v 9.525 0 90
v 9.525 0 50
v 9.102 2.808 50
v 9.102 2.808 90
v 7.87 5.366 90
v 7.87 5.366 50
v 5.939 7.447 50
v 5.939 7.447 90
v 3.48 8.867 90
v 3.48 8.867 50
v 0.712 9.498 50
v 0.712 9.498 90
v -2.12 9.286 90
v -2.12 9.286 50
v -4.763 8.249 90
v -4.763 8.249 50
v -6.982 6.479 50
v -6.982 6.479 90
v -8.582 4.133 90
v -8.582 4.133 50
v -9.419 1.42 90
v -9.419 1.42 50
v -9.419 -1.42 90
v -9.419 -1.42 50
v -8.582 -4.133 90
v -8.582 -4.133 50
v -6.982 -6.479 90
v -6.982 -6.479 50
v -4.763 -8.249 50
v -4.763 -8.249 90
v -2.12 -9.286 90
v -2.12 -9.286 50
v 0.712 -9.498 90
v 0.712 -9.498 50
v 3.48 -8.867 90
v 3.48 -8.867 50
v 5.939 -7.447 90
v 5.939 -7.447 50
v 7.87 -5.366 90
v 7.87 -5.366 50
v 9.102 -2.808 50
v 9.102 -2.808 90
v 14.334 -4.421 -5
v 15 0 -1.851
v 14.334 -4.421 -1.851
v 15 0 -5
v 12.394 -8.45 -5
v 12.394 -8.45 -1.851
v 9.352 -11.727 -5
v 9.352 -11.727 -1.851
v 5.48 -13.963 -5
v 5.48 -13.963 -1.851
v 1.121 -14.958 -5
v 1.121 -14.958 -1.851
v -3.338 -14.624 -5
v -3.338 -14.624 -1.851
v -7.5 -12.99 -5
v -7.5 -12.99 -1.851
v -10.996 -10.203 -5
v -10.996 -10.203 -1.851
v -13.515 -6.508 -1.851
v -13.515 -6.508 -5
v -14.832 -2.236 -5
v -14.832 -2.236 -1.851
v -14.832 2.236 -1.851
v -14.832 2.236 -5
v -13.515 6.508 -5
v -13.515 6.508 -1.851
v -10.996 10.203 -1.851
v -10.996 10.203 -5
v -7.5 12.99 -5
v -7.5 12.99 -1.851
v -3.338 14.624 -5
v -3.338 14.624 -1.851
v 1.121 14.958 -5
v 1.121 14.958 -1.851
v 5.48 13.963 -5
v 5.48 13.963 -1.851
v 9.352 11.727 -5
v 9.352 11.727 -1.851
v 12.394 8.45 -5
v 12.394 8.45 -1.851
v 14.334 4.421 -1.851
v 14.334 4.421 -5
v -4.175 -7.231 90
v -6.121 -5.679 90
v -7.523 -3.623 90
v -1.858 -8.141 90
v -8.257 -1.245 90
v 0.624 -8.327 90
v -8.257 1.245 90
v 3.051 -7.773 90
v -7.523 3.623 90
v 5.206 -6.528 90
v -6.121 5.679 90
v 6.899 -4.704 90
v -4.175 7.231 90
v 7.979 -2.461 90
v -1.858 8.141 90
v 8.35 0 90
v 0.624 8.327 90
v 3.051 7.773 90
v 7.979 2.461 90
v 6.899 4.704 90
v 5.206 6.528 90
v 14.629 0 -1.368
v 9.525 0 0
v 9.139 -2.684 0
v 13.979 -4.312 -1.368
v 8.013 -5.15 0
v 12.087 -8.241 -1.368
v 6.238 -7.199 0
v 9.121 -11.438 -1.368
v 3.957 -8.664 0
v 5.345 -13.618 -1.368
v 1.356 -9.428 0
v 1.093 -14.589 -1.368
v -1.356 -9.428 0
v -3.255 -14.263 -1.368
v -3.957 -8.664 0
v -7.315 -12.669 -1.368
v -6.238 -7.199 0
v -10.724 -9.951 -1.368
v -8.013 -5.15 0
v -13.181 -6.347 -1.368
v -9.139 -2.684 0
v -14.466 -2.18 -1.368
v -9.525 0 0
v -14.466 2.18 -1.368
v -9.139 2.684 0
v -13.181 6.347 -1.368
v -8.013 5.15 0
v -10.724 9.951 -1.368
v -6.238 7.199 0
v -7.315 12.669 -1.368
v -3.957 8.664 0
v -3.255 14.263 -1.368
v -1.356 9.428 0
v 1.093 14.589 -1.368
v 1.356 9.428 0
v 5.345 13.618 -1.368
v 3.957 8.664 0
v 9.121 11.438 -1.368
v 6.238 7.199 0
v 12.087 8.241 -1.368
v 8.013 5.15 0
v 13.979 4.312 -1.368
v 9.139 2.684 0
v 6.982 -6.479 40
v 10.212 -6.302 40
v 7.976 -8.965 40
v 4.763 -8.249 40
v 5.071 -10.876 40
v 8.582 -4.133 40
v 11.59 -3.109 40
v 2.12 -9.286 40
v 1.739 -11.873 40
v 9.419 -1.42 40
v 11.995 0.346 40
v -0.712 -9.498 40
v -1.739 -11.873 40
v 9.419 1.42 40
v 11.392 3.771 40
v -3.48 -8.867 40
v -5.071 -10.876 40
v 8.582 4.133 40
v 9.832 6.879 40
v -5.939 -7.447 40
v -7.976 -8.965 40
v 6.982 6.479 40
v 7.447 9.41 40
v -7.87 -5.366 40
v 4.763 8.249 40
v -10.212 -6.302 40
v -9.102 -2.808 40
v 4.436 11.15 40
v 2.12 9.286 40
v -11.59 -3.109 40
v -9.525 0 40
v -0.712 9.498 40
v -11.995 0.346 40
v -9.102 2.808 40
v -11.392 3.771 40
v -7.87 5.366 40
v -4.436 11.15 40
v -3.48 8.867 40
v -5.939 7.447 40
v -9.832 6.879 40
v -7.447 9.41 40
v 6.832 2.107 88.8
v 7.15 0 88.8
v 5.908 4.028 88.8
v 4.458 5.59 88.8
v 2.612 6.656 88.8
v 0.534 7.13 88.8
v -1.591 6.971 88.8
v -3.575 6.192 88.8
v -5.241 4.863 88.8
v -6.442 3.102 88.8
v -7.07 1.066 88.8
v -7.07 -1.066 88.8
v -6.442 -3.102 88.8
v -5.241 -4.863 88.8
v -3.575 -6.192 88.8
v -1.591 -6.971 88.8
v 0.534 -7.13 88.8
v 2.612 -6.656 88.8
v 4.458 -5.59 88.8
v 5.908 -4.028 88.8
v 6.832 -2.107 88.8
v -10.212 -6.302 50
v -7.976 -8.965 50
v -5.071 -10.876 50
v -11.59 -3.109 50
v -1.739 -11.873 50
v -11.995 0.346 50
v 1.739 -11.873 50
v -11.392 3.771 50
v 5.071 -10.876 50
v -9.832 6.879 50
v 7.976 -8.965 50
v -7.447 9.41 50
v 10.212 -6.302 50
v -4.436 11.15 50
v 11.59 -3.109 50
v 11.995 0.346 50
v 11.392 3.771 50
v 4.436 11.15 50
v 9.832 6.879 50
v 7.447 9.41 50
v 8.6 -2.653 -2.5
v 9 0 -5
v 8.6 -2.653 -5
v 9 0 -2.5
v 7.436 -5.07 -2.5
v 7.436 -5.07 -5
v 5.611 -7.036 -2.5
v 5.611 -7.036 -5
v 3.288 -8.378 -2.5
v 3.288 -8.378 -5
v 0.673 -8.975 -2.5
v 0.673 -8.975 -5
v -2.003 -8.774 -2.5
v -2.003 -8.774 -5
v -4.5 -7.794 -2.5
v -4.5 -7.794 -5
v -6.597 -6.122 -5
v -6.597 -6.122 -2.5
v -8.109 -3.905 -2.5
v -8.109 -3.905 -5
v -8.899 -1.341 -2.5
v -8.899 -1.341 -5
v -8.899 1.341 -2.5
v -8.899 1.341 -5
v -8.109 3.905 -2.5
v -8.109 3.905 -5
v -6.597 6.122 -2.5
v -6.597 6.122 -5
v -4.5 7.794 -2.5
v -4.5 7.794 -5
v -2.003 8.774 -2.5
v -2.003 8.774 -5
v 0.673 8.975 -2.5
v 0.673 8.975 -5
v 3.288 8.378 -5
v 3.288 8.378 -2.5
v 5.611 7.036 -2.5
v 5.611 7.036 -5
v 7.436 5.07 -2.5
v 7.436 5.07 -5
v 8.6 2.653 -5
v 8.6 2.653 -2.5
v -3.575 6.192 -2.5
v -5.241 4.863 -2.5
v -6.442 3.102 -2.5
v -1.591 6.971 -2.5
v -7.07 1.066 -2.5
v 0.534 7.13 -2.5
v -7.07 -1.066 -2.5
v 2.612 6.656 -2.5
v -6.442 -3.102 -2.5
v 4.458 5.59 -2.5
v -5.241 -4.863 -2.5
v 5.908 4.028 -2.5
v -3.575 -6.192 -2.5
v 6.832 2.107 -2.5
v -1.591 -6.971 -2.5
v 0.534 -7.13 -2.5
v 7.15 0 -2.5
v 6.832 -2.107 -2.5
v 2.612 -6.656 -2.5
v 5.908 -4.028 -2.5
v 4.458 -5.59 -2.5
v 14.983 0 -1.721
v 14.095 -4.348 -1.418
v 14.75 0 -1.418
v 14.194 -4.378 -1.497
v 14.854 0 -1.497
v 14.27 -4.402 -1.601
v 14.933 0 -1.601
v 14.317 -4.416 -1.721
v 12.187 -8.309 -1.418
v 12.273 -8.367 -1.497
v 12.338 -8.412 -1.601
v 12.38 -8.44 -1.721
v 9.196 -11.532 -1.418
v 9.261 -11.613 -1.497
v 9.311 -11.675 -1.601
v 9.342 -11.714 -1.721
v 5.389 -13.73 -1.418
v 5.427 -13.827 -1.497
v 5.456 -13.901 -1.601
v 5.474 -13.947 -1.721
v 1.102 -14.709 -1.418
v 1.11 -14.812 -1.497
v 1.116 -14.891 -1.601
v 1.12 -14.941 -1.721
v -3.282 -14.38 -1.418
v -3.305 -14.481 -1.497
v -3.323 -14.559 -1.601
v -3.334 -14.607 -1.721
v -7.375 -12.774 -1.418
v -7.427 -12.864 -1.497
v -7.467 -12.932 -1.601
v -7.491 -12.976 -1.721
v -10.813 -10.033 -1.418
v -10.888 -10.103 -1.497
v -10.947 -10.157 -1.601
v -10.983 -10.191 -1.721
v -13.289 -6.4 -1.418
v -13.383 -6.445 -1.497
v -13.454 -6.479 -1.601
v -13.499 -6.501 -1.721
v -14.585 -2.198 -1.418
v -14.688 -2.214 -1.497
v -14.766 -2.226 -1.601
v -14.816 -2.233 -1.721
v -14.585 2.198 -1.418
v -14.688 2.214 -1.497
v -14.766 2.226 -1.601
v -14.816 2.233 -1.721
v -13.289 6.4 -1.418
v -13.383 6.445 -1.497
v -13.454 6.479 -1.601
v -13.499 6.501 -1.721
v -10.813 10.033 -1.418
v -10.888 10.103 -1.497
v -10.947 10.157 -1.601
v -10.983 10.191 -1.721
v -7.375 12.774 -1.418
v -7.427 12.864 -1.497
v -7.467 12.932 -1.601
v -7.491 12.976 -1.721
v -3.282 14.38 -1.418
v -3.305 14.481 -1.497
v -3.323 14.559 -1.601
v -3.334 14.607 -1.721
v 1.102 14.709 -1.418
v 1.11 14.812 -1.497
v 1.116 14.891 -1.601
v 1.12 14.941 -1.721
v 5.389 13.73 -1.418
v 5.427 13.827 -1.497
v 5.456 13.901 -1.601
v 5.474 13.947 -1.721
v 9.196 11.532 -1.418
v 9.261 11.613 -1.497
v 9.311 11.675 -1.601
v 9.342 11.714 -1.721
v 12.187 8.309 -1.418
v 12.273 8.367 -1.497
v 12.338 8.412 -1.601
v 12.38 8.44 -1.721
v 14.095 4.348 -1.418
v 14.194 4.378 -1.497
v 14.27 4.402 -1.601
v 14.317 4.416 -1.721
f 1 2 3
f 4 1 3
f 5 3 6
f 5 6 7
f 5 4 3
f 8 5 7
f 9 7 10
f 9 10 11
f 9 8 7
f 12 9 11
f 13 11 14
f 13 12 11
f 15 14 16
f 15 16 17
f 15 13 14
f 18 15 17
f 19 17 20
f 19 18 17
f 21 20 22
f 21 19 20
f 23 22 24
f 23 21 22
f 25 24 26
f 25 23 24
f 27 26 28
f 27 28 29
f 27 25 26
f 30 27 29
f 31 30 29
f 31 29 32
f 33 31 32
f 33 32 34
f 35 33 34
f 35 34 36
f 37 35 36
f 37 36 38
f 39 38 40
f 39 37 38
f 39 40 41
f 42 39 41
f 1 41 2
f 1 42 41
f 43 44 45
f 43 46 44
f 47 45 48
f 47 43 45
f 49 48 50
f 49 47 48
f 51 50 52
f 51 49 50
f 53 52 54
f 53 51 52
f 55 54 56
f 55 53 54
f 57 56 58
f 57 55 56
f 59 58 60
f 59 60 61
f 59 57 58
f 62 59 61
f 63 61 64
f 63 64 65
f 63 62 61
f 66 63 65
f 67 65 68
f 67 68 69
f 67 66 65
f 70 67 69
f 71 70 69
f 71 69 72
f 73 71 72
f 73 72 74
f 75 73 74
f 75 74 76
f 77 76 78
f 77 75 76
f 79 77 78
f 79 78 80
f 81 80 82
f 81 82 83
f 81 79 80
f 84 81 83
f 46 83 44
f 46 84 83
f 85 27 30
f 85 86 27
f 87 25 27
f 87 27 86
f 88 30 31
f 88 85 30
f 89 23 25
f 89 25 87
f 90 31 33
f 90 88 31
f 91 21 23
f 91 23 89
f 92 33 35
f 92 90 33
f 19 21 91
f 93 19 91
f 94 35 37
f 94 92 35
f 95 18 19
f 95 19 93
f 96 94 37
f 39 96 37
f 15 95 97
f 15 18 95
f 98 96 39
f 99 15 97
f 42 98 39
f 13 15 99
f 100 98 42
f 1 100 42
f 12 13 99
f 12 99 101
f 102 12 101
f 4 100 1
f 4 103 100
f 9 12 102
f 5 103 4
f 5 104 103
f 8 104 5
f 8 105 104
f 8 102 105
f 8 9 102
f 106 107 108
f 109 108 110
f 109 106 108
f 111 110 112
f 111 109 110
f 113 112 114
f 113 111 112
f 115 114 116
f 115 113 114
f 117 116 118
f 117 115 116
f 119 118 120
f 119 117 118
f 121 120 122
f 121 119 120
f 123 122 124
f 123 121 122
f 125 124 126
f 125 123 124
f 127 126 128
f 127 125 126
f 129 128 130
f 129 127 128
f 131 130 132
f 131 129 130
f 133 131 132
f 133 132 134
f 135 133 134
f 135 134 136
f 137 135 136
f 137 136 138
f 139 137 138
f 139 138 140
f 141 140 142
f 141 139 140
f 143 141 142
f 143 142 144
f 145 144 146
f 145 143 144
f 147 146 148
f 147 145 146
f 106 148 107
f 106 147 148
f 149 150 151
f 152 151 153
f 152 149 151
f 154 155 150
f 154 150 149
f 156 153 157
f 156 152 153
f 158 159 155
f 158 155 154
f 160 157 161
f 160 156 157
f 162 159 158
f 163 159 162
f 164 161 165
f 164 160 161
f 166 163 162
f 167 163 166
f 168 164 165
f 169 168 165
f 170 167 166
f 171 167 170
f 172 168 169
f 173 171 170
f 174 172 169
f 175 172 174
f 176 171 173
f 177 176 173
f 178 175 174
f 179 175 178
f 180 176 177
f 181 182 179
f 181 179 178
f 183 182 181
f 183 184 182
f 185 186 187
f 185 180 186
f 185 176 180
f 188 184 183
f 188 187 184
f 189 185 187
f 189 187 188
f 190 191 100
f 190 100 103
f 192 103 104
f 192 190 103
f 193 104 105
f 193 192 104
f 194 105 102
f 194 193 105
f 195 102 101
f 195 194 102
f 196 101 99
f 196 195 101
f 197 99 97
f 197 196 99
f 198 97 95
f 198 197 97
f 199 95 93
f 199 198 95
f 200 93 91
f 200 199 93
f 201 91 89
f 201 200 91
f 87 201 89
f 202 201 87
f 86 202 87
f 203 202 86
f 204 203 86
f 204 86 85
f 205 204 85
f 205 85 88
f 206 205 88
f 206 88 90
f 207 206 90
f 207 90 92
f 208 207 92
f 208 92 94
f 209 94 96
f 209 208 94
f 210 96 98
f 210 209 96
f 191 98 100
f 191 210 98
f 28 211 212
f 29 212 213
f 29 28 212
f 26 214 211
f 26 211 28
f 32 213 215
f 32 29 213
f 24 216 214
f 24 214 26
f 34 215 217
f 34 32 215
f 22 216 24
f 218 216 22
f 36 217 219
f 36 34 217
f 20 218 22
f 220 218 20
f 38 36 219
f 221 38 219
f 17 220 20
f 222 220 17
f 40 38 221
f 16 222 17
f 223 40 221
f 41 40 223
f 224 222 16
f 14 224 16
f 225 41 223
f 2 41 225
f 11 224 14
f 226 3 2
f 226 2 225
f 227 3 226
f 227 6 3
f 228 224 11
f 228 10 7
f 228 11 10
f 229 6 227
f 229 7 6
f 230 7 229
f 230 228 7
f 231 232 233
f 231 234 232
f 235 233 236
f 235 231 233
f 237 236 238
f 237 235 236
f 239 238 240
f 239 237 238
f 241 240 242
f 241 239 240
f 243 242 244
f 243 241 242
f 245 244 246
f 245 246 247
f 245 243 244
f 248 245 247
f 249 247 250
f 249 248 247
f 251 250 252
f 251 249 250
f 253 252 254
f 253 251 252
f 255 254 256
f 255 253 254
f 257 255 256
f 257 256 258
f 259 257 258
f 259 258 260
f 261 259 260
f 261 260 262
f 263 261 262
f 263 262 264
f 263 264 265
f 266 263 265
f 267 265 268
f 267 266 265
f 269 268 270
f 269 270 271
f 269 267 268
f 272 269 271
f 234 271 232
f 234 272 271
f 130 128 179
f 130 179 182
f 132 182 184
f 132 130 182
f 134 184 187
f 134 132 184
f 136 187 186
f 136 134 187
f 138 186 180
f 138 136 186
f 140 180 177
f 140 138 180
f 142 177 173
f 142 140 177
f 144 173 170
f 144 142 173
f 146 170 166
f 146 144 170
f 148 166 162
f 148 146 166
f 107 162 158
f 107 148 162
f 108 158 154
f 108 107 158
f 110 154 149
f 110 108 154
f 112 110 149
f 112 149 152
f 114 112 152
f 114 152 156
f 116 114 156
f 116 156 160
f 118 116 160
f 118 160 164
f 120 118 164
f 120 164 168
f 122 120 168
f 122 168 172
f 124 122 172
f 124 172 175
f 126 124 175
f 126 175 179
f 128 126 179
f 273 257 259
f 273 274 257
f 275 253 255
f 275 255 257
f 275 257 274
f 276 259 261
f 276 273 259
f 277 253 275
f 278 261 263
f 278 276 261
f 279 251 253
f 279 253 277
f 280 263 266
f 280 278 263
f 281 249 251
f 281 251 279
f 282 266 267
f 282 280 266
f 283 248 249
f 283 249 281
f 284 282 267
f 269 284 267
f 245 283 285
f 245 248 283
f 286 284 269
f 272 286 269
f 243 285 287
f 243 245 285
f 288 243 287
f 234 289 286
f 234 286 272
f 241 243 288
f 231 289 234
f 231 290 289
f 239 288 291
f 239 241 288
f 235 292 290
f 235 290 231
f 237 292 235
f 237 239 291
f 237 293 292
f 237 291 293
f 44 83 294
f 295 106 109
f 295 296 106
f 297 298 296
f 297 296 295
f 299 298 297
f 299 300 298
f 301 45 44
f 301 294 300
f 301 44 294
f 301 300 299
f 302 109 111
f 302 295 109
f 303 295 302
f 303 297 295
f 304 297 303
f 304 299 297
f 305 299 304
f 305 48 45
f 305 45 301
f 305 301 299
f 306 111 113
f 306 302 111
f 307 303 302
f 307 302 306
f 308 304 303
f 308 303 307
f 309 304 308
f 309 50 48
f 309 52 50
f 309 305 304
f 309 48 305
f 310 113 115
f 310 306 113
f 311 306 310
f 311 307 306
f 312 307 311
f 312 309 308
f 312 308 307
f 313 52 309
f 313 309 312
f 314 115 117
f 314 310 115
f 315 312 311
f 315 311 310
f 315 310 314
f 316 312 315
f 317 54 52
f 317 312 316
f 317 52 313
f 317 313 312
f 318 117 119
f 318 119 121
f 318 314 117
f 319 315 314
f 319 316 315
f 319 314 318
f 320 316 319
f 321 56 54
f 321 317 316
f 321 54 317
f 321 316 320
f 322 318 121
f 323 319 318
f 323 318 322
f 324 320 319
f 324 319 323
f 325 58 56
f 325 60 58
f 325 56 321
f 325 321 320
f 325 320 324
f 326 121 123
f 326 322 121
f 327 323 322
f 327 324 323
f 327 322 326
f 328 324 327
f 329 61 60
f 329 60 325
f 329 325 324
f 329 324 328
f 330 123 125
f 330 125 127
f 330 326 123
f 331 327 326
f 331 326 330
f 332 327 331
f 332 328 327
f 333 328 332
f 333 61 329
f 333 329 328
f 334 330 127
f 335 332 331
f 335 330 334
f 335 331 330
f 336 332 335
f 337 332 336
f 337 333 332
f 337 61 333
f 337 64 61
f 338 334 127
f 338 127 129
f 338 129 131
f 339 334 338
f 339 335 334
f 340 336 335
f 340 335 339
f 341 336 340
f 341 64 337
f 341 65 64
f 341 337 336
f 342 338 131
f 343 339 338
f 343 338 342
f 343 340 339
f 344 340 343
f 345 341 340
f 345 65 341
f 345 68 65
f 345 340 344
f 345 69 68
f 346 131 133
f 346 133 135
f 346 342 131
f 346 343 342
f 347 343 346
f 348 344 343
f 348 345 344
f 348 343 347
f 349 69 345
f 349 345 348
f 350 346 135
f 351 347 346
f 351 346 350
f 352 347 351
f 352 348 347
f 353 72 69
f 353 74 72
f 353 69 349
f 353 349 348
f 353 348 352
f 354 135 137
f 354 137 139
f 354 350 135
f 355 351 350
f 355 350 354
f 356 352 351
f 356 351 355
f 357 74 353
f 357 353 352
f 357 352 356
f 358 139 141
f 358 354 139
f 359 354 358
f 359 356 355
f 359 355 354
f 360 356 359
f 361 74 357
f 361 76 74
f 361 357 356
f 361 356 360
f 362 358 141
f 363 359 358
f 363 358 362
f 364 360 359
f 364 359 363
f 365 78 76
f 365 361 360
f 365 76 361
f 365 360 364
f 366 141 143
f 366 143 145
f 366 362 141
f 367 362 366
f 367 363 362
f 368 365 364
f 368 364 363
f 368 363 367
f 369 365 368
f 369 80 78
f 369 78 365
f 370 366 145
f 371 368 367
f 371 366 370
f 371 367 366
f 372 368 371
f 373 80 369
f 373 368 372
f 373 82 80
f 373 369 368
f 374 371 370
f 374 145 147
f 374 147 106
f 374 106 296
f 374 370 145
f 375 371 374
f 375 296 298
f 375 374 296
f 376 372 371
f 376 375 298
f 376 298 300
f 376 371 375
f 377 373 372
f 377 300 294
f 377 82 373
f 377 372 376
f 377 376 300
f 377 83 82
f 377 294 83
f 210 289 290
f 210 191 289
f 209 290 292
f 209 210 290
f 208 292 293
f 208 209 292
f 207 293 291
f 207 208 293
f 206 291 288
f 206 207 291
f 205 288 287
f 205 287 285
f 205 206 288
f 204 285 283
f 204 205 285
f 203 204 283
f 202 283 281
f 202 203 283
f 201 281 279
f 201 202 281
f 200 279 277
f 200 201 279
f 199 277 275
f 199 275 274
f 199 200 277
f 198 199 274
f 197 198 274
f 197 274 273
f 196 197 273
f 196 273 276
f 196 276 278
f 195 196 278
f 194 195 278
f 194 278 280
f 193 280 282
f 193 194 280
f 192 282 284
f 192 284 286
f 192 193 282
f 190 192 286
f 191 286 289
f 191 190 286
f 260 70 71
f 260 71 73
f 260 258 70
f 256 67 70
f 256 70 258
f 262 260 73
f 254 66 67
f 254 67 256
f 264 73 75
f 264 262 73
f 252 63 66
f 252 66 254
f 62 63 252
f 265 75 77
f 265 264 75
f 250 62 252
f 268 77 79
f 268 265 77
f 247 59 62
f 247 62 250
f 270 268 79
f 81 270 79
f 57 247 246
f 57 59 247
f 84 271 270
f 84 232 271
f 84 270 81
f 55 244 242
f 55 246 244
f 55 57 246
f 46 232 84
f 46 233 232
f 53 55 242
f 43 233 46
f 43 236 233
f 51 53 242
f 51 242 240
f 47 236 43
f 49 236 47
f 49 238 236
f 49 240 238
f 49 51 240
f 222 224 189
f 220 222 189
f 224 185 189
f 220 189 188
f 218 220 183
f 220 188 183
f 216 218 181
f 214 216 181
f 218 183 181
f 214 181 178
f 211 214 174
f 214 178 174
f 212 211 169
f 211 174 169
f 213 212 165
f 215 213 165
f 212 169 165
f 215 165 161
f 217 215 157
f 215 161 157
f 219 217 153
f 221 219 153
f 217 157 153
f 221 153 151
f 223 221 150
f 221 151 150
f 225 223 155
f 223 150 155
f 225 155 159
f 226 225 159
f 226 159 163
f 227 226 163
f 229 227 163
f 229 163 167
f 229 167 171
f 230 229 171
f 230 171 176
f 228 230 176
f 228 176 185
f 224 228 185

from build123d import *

# Parameters (mm, degrees)
SKETCH1_R           = 12
BOSS_EXTRUDE1_DEPTH = 90
SKETCH3_OUTSIDE_W   = 45.238
SKETCH3_OUTSIDE_H   = 45.238
SKETCH3_OUTSIDE_R   = 9.525
CUT_EXTRUDE1_DEPTH  = 40
SKETCH4_OUTSIDE_W   = 45.238
SKETCH4_OUTSIDE_H   = 45.238
SKETCH4_OUTSIDE_R   = 9.525
CUT_EXTRUDE2_DEPTH  = 40
SKETCH6_R           = 7.15
CUT_EXTRUDE3_DEPTH  = 91
CHAMFER1_SIZE       = 1.2
CUT_EXTRUDE4_DEPTH  = 91


with BuildPart() as part:
    # Sketch1 → Boss-Extrude1 (new body)
    with BuildSketch(Plane.XY):
        Circle(SKETCH1_R)
    extrude(amount=BOSS_EXTRUDE1_DEPTH)

    # Sketch3 outside → Cut-Extrude1 (cut)
    with BuildSketch(Plane.XY.offset(90)):
        Rectangle(SKETCH3_OUTSIDE_W, SKETCH3_OUTSIDE_H)
        Circle(SKETCH3_OUTSIDE_R, mode=Mode.SUBTRACT)
    extrude(amount=-CUT_EXTRUDE1_DEPTH, mode=Mode.SUBTRACT)

    # Sketch4 outside → Cut-Extrude2 (cut)
    with BuildSketch(Plane(origin=(0, 0, 0), x_dir=(-1, 0, 0), z_dir=(0, 0, -1))):
        Rectangle(SKETCH4_OUTSIDE_W, SKETCH4_OUTSIDE_H)
        Circle(SKETCH4_OUTSIDE_R, mode=Mode.SUBTRACT)
    extrude(amount=-CUT_EXTRUDE2_DEPTH, mode=Mode.SUBTRACT)

    # Sketch6 → Cut-Extrude3 (cut, through all)
    with BuildSketch(Plane.XY.offset(90)):
        Circle(SKETCH6_R)
    extrude(amount=-CUT_EXTRUDE3_DEPTH, mode=Mode.SUBTRACT)

    # Chamfer1
    chamfer1_edges = [part.edges().sort_by_distance(p)[0] for p in [
        (-7.15, 0, 90),
    ]]
    chamfer(chamfer1_edges, length=CHAMFER1_SIZE)

    # Sketch7 → Cut-Extrude4 (cut, through all)
    with BuildSketch(Plane(origin=(0, 0, 0), x_dir=(-1, 0, 0), z_dir=(0, 0, -1))):
        Polygon((0, 11.15), (-4.435932822, 11.15), (-4.435932822, 13.87296042), (4.435932822, 13.87296042), (4.435932822, 11.15), align=None)
    extrude(amount=-CUT_EXTRUDE4_DEPTH, mode=Mode.SUBTRACT)

    # Sketch10 → Revolve1 (revolve)
    with BuildSketch(Plane(origin=(0, 0, 0), x_dir=(1, 0, 0), z_dir=(0, 1, 0))):
        with BuildLine():
            Line((9.525, 0), (14.629409523, 1.367722409))
            ThreePointArc((14.629409523, 1.367722409), (14.89667667, 1.546304608), (15, 1.850685323))
            Line((15, 1.850685323), (15, 5))
            Line((15, 5), (9, 5))
            Line((9, 5), (9, 2.5))
            Line((9, 2.5), (7.15, 2.5))
            Line((7.15, 2.5), (7.15, 0))
            Line((7.15, 0), (9.525, 0))
        make_face()
    revolve(axis=Axis((0, 0, 1.6), (0, 0, -1)))


solid = part.part
